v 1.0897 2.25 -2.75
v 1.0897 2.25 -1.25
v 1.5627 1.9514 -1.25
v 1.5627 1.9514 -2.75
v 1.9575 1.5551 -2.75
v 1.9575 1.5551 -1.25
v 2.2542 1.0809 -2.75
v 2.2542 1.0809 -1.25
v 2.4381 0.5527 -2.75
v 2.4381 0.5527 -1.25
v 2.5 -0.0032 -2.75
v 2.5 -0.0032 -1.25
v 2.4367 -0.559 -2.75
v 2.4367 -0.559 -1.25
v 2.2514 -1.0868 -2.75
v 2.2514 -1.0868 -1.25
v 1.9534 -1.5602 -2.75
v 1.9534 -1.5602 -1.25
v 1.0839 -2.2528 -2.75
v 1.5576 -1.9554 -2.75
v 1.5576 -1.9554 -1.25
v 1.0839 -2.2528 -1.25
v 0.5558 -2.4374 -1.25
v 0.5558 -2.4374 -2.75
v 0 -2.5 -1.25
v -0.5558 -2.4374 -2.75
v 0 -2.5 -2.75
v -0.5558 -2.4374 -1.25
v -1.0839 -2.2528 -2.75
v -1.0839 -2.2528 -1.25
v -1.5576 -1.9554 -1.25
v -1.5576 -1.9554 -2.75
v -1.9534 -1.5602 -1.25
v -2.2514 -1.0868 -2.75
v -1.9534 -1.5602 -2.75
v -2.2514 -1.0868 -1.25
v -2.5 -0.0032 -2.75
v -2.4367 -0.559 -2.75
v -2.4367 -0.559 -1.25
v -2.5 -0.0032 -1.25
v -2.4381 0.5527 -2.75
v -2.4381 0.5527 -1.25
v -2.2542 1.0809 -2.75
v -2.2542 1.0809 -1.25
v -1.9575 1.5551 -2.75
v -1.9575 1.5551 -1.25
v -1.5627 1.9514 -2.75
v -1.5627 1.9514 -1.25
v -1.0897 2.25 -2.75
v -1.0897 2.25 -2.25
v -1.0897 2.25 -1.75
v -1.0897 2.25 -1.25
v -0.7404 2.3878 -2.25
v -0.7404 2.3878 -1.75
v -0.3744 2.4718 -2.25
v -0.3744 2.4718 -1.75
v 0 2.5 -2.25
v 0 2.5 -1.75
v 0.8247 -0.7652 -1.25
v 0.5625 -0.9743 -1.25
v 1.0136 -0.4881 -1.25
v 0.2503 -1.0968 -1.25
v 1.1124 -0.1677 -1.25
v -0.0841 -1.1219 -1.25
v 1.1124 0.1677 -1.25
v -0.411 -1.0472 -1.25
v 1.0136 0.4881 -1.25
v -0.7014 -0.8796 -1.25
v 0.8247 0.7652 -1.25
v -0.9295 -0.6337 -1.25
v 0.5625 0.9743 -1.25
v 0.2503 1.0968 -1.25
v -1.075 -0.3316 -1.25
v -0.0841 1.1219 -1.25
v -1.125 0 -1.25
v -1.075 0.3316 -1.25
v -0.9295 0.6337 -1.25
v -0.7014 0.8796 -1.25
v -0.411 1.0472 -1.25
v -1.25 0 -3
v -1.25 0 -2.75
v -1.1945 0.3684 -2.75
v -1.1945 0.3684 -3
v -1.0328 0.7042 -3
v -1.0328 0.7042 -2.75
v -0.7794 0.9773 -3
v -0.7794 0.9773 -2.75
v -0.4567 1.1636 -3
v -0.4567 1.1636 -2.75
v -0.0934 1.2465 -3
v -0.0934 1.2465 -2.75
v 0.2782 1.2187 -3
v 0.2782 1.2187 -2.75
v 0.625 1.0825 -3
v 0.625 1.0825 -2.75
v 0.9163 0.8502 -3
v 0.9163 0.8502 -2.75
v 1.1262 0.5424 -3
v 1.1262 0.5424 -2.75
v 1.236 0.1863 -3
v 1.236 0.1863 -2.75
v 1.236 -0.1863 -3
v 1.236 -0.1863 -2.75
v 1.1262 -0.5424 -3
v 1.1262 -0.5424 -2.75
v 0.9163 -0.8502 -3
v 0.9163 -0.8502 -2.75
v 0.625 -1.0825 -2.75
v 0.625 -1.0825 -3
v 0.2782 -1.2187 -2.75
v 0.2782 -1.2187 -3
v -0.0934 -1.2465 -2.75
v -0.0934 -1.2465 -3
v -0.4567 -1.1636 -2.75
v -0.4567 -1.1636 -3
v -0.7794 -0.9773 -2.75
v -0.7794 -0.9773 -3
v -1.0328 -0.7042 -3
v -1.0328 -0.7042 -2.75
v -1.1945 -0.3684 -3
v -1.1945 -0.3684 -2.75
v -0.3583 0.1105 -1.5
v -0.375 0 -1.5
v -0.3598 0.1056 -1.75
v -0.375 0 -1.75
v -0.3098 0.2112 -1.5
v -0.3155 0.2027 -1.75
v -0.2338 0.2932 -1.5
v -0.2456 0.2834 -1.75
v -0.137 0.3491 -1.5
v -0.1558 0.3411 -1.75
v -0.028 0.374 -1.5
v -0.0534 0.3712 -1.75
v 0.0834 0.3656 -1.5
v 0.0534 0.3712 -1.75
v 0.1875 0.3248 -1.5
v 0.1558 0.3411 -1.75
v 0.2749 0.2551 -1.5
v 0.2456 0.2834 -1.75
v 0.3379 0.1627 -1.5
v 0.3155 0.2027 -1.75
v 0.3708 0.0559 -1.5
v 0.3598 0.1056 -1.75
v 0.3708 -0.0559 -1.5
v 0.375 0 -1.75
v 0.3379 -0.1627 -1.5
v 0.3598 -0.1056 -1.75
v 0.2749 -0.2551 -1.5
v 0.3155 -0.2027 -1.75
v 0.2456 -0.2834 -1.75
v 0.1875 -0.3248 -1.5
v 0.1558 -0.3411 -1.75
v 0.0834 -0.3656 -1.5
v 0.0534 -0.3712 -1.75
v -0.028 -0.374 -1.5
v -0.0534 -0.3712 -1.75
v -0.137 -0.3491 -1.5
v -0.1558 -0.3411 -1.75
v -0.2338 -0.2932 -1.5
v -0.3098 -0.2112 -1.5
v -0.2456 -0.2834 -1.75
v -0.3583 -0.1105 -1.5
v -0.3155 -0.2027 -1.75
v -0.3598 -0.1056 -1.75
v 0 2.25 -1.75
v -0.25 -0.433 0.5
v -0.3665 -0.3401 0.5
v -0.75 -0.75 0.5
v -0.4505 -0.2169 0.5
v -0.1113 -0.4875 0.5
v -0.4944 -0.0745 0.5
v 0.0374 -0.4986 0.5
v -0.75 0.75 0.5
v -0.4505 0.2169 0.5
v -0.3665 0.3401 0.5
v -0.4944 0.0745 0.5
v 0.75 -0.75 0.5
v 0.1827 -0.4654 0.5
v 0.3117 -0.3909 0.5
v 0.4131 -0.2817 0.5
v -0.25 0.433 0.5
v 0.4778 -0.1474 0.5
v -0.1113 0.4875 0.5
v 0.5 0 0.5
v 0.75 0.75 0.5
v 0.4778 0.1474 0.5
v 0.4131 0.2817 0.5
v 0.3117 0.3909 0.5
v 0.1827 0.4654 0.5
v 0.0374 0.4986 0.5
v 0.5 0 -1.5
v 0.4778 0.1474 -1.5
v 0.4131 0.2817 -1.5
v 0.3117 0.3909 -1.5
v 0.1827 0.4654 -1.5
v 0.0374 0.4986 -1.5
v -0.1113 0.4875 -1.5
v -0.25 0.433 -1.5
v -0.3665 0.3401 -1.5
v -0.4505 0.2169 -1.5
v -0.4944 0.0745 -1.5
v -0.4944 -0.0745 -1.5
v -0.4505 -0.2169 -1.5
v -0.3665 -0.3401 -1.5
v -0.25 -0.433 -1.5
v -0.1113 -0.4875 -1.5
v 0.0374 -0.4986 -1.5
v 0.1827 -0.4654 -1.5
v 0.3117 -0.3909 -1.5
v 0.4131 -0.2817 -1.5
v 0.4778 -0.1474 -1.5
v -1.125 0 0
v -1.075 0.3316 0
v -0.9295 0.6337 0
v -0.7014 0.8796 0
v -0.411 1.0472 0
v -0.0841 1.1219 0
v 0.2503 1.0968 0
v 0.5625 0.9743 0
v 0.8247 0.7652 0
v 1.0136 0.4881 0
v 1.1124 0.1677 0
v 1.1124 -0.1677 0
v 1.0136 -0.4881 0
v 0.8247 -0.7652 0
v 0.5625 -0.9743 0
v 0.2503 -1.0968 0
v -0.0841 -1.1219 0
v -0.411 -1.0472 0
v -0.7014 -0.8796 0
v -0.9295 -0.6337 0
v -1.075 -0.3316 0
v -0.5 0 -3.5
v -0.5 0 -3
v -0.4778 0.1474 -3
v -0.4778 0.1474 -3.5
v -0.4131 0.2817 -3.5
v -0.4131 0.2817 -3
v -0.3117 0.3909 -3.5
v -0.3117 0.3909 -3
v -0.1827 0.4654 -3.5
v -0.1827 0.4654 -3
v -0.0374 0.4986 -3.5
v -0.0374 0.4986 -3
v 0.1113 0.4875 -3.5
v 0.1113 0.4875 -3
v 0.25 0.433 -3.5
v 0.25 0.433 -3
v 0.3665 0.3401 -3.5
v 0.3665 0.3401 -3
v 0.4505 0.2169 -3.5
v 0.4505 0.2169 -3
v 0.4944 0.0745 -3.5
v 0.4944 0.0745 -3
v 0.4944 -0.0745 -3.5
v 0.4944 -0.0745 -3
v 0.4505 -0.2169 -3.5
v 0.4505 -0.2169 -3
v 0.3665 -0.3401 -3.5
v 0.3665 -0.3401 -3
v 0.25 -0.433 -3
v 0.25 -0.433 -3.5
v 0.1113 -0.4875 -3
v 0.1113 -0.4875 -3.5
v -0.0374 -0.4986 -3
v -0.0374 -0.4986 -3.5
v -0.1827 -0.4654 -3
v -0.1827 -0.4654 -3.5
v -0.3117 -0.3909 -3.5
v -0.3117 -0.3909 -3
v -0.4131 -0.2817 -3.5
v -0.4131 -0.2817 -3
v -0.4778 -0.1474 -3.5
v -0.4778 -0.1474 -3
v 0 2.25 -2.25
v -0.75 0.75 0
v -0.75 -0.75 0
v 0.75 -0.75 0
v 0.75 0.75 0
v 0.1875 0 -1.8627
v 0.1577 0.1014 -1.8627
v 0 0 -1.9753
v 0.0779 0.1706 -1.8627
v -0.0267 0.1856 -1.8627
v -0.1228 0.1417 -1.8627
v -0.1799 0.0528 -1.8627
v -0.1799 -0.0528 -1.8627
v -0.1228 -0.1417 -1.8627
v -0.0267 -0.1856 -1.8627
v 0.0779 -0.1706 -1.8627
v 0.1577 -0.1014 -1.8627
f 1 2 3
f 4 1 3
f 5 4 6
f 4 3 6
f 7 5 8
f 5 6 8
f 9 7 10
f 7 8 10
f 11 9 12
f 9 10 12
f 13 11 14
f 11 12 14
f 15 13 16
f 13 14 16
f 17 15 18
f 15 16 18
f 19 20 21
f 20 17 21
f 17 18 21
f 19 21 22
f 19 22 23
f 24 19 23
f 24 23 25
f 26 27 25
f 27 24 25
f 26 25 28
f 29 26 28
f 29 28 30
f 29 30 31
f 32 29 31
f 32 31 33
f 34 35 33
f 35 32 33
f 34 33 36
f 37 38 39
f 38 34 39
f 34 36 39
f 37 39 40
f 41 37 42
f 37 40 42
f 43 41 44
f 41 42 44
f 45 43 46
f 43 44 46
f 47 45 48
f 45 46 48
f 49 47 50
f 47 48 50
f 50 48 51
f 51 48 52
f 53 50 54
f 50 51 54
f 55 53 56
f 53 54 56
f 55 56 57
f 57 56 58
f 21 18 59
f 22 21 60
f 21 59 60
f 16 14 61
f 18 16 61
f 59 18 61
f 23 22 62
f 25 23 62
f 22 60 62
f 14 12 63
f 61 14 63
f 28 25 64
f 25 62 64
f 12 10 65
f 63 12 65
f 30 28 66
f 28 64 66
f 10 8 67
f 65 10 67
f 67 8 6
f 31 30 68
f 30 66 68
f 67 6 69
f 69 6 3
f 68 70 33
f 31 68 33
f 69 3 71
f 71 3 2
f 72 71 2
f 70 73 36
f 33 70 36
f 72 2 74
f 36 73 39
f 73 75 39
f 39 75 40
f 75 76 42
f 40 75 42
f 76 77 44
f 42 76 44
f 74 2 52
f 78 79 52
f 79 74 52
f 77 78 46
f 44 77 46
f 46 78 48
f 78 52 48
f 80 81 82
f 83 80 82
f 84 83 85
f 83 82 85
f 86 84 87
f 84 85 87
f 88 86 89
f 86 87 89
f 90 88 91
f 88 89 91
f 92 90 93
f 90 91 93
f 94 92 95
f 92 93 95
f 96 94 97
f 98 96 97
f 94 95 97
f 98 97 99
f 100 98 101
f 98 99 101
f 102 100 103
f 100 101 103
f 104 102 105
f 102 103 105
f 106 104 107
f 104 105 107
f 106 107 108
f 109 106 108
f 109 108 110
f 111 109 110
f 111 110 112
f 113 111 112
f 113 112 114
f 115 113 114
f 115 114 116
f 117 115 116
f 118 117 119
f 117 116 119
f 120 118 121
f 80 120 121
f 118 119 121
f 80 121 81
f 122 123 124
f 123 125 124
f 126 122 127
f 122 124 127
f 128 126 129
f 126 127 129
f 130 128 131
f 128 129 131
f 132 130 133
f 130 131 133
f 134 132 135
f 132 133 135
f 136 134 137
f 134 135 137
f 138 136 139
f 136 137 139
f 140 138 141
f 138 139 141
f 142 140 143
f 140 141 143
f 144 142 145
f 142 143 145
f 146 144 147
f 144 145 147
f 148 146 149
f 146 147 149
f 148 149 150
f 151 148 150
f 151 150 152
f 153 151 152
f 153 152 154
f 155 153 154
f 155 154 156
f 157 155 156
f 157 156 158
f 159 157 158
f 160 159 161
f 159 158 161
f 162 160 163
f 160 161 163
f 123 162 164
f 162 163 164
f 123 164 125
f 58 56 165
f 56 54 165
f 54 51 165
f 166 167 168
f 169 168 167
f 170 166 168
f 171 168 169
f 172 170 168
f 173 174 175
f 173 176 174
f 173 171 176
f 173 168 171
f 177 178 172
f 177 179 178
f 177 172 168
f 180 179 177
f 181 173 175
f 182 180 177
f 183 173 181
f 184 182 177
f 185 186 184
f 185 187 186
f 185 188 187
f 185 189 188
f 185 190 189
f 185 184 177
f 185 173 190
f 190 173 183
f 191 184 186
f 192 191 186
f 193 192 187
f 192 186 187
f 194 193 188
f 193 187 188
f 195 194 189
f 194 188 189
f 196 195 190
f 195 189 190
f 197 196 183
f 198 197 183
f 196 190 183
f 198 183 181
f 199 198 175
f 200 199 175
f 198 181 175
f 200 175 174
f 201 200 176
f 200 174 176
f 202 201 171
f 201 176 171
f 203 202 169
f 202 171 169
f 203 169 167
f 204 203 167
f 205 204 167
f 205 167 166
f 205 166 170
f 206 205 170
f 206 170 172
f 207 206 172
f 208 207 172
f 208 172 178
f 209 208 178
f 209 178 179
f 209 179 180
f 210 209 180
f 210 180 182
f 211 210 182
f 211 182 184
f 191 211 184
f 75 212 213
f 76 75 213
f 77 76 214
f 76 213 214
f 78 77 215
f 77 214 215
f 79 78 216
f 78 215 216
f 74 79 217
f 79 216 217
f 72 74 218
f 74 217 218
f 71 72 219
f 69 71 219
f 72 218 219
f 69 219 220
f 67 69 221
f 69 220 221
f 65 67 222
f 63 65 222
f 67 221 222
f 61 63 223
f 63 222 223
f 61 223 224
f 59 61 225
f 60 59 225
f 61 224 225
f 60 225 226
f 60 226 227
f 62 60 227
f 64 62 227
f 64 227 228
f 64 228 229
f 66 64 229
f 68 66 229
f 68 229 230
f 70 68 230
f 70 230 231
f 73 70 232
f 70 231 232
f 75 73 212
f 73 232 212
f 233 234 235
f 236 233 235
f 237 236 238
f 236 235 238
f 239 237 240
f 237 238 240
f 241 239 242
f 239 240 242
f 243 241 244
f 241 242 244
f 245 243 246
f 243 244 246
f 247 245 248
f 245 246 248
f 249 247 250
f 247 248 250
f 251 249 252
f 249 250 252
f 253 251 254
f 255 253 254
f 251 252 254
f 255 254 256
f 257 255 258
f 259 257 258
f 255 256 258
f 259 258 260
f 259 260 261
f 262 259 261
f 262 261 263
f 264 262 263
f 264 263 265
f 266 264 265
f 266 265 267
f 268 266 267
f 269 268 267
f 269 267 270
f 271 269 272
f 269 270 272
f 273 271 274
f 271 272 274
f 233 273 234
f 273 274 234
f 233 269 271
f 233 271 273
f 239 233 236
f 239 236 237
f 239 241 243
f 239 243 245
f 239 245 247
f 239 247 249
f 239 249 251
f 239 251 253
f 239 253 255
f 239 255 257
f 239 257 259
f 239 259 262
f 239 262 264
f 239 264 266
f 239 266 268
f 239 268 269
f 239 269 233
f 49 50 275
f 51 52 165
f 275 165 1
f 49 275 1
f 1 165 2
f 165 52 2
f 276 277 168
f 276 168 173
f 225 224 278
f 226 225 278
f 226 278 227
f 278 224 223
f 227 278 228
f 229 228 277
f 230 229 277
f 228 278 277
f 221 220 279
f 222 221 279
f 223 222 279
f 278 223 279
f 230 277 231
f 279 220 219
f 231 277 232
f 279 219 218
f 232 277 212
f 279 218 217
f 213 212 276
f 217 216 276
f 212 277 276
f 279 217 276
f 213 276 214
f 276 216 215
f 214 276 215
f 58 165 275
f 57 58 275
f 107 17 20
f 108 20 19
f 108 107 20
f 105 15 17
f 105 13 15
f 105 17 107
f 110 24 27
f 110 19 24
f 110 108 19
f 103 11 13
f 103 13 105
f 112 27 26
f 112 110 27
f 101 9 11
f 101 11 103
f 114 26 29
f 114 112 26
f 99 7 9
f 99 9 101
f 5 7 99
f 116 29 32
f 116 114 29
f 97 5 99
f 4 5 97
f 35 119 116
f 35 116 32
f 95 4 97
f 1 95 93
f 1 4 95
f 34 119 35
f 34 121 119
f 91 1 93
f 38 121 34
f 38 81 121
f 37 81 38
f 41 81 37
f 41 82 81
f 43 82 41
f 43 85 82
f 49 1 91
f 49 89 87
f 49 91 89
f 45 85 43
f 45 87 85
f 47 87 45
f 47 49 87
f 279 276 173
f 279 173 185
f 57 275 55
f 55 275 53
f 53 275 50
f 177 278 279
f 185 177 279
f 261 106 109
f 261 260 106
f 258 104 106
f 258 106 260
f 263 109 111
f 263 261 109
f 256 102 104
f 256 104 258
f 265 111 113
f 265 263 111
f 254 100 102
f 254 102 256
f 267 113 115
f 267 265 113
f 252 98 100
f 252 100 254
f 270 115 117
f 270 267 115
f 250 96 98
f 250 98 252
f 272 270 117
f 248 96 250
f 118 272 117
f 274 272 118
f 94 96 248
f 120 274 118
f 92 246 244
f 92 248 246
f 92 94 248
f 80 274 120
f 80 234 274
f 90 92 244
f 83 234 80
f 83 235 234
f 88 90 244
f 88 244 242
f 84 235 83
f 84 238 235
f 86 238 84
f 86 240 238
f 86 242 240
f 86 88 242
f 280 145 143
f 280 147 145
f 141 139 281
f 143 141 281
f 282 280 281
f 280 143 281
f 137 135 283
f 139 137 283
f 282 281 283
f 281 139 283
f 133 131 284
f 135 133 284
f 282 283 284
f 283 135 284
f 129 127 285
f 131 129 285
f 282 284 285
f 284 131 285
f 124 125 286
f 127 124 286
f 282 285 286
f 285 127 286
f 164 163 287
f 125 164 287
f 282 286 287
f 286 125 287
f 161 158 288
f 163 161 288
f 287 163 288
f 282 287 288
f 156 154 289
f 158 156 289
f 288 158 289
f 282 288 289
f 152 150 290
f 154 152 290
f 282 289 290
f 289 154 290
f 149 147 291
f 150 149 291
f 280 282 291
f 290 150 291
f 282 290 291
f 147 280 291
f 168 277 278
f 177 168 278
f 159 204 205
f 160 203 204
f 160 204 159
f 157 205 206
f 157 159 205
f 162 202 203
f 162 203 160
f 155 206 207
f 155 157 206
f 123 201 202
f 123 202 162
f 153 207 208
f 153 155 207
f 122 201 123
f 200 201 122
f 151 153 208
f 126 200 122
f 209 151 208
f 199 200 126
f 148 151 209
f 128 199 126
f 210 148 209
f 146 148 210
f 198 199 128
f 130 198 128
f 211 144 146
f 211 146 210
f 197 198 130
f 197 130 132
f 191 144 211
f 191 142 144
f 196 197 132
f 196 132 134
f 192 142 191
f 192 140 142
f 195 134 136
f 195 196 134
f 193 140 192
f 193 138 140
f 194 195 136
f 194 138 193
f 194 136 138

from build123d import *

# Parameters (mm, degrees)
CROQUIS1_W                           = 1.5
CROQUIS1_H                           = 1.5
SALIENTE_EXTRUIR1_DEPTH              = 0.5
CROQUIS2_R                           = 1.125
SALIENTE_EXTRUIR2_DEPTH              = 1.25
CROQUIS5_R                           = 2.5
SALIENTE_EXTRUIR5_DEPTH              = 1.5
CROQUIS6_R                           = 1.25
SALIENTE_EXTRUIR6_DEPTH              = 0.25
CROQUIS7_R                           = 0.5
SALIENTE_EXTRUIR7_DEPTH              = 0.5
CORTAR_EXTRUIR1_DEPTH                = 10
TALADRO_ROSCADO_M1X0_251_D           = 0.75
TALADRO_ROSCADO_M1X0_251_DEPTH       = 2.25
TALADRO_ROSCADO_M1X0_251_CBORE_D     = 1
TALADRO_ROSCADO_M1X0_251_CBORE_DEPTH = 2
TALADRO_ROSCADO_M1X0_251_TIP         = 0.225322732


with BuildPart() as part:
    # Croquis1 → Saliente-Extruir1 (new body)
    with BuildSketch(Plane.XY):
        Rectangle(CROQUIS1_W, CROQUIS1_H)
    extrude(amount=SALIENTE_EXTRUIR1_DEPTH)

    # Croquis2 → Saliente-Extruir2 (add)
    with BuildSketch(Plane(origin=(0, 0, 0), x_dir=(-1, 0, 0), z_dir=(0, 0, -1))):
        Circle(CROQUIS2_R)
    extrude(amount=SALIENTE_EXTRUIR2_DEPTH)

    # Croquis5 → Saliente-Extruir5 (add)
    with BuildSketch(Plane(origin=(0, 0, -1.25), x_dir=(-1, 0, 0), z_dir=(0, 0, -1))):
        Circle(CROQUIS5_R)
    extrude(amount=SALIENTE_EXTRUIR5_DEPTH)

    # Croquis6 → Saliente-Extruir6 (add)
    with BuildSketch(Plane(origin=(0, 0, -2.75), x_dir=(-1, 0, 0), z_dir=(0, 0, -1))):
        Circle(CROQUIS6_R)
    extrude(amount=SALIENTE_EXTRUIR6_DEPTH)

    # Croquis7 → Saliente-Extruir7 (add)
    with BuildSketch(Plane(origin=(0, 0, -3), x_dir=(-1, 0, 0), z_dir=(0, 0, -1))):
        Circle(CROQUIS7_R)
    extrude(amount=SALIENTE_EXTRUIR7_DEPTH)

    # Croquis11 → Cortar-Extruir1 (cut)
    with BuildSketch(Plane(origin=(0, 2.25, 0), x_dir=(-1, 0, 0), z_dir=(0, 1, 0))):
        Polygon((-1.5, -1.25), (1.5, -1.25), (1.5, -1.75), (0, -1.75), (0, -2.25), (1.5, -2.25), (1.5, -2.75), (-1.5, -2.75), align=None)
    extrude(amount=CORTAR_EXTRUIR1_DEPTH, mode=Mode.SUBTRACT)

    # Taladro roscado M1x0.251
    with Locations(Plane.XY.offset(0.5)):
        with Locations((0, 0)):
            CounterBoreHole(TALADRO_ROSCADO_M1X0_251_D / 2, TALADRO_ROSCADO_M1X0_251_CBORE_D / 2, TALADRO_ROSCADO_M1X0_251_CBORE_DEPTH, depth=TALADRO_ROSCADO_M1X0_251_DEPTH)
            with Locations((0, 0, -(TALADRO_ROSCADO_M1X0_251_DEPTH + TALADRO_ROSCADO_M1X0_251_TIP / 2))):  # 118° drill point
                Cone(0, TALADRO_ROSCADO_M1X0_251_D / 2, TALADRO_ROSCADO_M1X0_251_TIP, mode=Mode.SUBTRACT)


solid = part.part
